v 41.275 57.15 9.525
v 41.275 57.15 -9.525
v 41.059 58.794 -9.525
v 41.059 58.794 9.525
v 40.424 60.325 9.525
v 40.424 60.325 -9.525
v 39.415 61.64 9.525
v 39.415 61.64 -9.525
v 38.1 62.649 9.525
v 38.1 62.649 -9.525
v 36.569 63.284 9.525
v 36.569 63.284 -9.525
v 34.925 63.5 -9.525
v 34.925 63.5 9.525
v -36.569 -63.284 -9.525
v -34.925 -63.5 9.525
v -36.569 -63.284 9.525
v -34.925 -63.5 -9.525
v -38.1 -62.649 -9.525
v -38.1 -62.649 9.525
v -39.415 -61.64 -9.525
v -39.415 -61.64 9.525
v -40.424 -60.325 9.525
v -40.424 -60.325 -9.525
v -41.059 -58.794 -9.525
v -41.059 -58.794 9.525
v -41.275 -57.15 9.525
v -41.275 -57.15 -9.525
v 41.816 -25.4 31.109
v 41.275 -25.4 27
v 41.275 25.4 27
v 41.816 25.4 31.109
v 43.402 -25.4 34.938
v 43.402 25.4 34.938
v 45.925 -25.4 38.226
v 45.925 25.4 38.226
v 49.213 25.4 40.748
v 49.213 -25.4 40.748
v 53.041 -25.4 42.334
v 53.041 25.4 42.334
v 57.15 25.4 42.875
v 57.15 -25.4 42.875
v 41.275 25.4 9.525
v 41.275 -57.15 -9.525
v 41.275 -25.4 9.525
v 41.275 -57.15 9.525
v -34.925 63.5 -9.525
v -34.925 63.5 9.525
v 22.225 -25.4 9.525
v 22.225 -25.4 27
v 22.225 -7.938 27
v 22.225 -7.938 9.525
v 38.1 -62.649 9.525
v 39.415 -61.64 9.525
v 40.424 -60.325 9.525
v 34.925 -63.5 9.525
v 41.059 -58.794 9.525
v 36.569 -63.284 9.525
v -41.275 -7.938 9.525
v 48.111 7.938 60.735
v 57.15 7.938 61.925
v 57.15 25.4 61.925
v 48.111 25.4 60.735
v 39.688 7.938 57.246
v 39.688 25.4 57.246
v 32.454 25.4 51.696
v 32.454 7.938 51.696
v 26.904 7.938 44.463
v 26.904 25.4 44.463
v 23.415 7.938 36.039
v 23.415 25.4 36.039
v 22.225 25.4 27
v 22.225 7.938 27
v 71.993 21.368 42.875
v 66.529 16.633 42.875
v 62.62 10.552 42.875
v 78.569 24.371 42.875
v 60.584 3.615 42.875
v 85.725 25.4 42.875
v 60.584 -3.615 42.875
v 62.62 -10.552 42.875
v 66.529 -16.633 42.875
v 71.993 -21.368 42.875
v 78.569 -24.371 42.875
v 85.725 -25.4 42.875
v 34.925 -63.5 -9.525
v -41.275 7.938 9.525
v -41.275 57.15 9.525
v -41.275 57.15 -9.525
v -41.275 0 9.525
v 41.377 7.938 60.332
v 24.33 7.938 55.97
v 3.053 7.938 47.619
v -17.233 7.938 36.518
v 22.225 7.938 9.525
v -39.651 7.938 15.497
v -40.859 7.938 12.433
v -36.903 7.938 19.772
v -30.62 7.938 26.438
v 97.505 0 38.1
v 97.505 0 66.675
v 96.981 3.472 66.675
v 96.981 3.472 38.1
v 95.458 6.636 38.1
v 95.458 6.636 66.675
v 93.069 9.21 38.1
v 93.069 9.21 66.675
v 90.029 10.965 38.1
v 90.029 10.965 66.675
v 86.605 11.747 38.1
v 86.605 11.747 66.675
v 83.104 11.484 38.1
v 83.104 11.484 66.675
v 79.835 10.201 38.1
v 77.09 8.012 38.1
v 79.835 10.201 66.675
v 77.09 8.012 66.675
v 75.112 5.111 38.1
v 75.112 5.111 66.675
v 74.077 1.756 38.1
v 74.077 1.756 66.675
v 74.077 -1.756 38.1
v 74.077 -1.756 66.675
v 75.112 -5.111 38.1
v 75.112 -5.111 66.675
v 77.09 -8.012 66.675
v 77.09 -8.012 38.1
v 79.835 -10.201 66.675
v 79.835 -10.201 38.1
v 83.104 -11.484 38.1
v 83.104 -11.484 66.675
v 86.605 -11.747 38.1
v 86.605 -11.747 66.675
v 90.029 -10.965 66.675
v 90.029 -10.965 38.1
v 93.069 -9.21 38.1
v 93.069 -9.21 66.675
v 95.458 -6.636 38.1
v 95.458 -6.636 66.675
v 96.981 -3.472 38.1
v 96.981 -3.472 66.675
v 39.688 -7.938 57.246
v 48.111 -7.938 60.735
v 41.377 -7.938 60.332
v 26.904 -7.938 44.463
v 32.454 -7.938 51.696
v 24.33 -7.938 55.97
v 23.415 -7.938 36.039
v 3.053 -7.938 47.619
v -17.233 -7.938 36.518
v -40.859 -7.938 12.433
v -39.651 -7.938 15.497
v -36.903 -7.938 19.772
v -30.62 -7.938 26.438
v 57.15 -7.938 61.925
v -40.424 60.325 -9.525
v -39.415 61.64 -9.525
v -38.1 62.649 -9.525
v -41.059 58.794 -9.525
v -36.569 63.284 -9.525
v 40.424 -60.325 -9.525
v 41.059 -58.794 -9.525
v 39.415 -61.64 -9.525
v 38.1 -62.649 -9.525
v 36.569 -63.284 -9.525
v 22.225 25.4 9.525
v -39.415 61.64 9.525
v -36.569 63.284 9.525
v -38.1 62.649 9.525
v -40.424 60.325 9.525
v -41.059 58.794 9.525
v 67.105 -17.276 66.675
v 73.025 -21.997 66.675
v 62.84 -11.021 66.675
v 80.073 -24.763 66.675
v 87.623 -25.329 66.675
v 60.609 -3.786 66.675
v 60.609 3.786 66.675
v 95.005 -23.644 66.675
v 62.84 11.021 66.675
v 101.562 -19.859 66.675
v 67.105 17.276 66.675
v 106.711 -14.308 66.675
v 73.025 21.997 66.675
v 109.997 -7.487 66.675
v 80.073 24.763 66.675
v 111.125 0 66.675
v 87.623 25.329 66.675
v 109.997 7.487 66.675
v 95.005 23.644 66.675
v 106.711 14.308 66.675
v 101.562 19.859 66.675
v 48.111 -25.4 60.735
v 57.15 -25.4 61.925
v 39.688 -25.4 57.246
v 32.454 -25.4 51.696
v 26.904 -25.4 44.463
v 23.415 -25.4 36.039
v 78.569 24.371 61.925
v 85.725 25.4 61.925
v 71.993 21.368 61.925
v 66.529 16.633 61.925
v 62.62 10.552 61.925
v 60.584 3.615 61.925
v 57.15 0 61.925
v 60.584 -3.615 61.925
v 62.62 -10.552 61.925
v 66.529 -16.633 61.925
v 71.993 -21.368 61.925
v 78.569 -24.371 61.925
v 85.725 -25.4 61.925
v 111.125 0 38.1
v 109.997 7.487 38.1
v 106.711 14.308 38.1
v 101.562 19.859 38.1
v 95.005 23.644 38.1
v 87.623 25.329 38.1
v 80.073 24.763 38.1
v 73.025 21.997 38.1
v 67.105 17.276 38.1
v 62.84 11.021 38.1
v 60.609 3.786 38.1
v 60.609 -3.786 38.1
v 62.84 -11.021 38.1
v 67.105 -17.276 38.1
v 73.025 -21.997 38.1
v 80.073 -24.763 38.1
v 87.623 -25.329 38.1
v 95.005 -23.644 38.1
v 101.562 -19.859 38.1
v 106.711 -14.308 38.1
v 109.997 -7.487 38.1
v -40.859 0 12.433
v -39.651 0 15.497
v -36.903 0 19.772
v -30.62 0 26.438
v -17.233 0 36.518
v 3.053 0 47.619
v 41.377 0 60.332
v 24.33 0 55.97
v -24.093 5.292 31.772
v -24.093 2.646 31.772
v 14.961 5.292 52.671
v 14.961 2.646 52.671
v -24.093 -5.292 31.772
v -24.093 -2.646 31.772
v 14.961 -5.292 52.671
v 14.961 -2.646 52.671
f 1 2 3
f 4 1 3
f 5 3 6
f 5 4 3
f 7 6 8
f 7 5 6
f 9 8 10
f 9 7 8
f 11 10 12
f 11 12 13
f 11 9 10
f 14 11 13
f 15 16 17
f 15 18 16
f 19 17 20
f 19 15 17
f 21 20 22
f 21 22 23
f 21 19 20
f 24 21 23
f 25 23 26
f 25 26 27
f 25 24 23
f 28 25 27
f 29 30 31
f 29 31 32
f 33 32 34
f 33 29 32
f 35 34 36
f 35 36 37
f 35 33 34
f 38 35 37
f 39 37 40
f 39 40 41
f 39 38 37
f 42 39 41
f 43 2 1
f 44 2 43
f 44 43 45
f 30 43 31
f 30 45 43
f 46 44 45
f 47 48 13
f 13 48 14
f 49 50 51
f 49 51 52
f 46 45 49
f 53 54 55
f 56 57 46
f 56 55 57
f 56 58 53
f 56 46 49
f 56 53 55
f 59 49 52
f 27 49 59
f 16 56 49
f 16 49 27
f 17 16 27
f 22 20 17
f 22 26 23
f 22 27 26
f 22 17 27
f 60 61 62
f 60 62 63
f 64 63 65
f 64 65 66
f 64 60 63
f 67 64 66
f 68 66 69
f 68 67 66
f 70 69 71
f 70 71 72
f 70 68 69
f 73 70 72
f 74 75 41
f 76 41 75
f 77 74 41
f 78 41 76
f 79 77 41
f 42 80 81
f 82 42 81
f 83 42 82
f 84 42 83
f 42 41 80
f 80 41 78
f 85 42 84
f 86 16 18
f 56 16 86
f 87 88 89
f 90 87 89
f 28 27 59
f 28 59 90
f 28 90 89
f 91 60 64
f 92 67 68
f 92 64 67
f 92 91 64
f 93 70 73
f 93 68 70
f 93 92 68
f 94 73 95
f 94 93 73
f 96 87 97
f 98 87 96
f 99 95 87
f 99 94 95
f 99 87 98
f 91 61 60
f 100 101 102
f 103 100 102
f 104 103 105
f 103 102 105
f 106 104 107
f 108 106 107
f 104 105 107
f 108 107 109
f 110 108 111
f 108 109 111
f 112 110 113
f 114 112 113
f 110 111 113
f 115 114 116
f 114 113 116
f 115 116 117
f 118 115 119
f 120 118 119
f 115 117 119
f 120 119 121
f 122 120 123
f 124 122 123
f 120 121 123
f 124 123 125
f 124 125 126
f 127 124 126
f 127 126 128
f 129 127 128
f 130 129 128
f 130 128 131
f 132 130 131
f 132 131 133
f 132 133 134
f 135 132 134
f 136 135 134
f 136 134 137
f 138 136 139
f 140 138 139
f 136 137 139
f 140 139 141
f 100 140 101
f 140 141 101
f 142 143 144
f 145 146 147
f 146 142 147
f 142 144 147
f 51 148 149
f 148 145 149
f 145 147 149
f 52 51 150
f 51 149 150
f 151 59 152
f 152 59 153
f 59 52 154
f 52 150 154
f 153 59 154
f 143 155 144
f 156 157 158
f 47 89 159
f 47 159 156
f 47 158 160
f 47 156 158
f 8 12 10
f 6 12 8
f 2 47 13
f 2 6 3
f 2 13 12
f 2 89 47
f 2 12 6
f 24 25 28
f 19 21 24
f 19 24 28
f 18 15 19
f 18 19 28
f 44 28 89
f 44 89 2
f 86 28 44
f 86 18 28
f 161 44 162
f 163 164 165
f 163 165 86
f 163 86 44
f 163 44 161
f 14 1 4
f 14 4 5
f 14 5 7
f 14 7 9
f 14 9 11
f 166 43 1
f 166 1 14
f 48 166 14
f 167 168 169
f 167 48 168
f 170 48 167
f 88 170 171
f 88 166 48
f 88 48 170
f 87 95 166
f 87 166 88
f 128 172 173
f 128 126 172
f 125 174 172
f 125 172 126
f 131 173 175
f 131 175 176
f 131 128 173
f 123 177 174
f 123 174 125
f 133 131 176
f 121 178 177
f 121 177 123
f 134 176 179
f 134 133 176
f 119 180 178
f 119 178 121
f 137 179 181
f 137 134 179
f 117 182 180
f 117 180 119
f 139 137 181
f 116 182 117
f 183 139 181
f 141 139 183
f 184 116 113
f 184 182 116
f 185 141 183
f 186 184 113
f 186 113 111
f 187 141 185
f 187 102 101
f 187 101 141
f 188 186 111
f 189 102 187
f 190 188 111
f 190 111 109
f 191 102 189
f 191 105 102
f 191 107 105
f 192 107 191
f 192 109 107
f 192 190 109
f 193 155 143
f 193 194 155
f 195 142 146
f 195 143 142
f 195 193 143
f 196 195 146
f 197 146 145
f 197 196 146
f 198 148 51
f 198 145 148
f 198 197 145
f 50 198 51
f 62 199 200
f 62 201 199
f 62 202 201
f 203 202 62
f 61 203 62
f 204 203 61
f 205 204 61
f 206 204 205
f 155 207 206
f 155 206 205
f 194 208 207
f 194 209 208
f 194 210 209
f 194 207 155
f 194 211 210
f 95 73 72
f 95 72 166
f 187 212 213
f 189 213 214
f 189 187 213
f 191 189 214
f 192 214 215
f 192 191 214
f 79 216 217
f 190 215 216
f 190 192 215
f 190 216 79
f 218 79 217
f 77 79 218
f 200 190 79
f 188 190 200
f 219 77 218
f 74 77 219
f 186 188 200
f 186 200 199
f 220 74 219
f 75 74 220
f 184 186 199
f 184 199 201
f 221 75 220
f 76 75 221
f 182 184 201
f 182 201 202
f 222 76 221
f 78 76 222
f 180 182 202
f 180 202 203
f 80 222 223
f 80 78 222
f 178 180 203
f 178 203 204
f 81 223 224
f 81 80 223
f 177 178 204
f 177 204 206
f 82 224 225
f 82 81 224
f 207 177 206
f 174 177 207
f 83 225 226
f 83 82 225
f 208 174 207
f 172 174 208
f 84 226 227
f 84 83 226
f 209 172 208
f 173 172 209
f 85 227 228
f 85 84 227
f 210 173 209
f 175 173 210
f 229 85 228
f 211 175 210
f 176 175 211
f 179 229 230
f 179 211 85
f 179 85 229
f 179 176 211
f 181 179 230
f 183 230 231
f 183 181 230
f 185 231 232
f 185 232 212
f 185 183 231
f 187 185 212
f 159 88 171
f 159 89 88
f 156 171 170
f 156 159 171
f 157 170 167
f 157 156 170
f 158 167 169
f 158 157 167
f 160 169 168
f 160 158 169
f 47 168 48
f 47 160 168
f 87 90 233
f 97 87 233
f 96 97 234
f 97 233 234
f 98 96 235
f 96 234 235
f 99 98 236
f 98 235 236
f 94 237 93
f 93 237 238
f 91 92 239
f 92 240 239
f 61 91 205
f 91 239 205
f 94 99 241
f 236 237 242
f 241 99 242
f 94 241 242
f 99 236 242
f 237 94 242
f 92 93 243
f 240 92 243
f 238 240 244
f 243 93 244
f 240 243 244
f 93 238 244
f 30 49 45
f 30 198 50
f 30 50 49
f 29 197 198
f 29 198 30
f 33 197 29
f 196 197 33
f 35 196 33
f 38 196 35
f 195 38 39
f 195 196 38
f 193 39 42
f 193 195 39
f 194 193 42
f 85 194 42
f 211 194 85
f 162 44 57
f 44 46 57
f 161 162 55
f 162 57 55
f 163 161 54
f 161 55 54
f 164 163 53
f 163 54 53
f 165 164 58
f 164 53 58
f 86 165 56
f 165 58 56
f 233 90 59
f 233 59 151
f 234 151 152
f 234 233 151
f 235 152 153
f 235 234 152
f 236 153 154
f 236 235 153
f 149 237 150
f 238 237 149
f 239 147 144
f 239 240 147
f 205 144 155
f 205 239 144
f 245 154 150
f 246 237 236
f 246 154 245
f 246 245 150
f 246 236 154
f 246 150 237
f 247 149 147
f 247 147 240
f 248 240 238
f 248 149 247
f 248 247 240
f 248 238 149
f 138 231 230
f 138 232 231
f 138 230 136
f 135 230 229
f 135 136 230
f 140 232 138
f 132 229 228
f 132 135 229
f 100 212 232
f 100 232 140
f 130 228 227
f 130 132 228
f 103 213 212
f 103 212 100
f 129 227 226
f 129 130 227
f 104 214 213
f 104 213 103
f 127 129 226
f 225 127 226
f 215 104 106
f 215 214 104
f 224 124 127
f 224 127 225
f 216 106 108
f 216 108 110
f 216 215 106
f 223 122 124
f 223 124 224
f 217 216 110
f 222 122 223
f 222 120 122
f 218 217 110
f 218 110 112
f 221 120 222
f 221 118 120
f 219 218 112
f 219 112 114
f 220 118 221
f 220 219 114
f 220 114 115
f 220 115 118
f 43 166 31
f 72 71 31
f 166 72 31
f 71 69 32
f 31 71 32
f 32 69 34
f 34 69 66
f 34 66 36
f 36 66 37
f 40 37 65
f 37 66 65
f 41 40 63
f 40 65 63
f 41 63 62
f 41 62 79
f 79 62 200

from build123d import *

# Parameters (mm, degrees)
F1_DEPTH = 63.5
F0_W     = 25.4
F0_H     = 19.05
F2_DEPTH = 25.4
F3_DEPTH = 7.9375
F5_R     = 6.35
F6_R     = 11.7795473759
F7_DEPTH = 28.575


with BuildPart() as f1:
    # F0 (on Front) → F1 (new body, symmetric)
    with BuildSketch(Plane.XZ):
        Polygon((-41.275, 9.525), (-41.275, -9.525), (41.275, -9.525), (41.275, 9.525), (22.225, 9.525), align=None)
    extrude(amount=F1_DEPTH, both=True)

    # F0 (on Front) → F2 (join, symmetric)
    with BuildSketch(Plane.XZ):
        with BuildLine():
            Line((22.225, 9.525), (41.275, 9.525))
            Line((41.275, 9.525), (41.275, 27.0002))
            ThreePointArc((41.275, 27.0002), (45.9246798487, 38.2255201513), (57.15, 42.8752))
            Line((57.15, 42.8752), (60.325, 42.8752))
            Line((60.325, 42.8752), (60.325, 61.9252))
            Line((60.325, 61.9252), (57.15, 61.9252))
            ThreePointArc((57.15, 61.9252), (32.4542956671, 51.6959043329), (22.225, 27.0002))
            Line((22.225, 27.0002), (22.225, 9.525))
        make_face()
        with Locations((73.025, 52.4002)):
            Rectangle(F0_W, F0_H)
    extrude(amount=F2_DEPTH, both=True)

    # F0 (on Front) → F3 (join, symmetric)
    with BuildSketch(Plane.XZ):
        with BuildLine():
            add(Edge.make_bspline(
                [(-41.275, 9.525), (-41.275, 29.0132258087), (19.6397230029, 61.9252), (57.15, 61.9252)],
                knots=[0, 0, 0, 0, 111.5045361635, 111.5045361635, 111.5045361635, 111.5045361635], degree=3))
            Line((-41.275, 9.525), (22.225, 9.525))
            Line((22.225, 9.525), (22.225, 27.0002))
            ThreePointArc((22.225, 27.0002), (32.4542956671, 51.6959043329), (57.15, 61.9252))
        make_face()
    extrude(amount=F3_DEPTH, both=True)

    # F0 (on Front) → F4 (revolve)
    with BuildSketch(Plane.XZ):
        Polygon((85.725, 66.675), (85.725, 61.9252), (85.725, 42.8752), (85.725, 38.1), (111.125, 38.1), (111.125, 66.675), align=None)
    revolve(axis=Axis((85.725, 0, 52.3875), (0, 0, 1)))

    # F5
    f5_edges = [f1.edges().sort_by_distance(p)[0] for p in [
        (41.275, -63.5, 0),
        (-41.275, -63.5, 0),
        (-41.275, 63.5, 0),
        (41.275, 63.5, 0),
    ]]
    fillet(f5_edges, radius=F5_R)

    # F6 (on face) → F7 (cut, through all)
    with BuildSketch(Plane.XY.offset(66.675)):
        with Locations((85.725, 0)):
            Circle(F6_R)
    extrude(amount=-F7_DEPTH, mode=Mode.SUBTRACT)


solid = f1.part
